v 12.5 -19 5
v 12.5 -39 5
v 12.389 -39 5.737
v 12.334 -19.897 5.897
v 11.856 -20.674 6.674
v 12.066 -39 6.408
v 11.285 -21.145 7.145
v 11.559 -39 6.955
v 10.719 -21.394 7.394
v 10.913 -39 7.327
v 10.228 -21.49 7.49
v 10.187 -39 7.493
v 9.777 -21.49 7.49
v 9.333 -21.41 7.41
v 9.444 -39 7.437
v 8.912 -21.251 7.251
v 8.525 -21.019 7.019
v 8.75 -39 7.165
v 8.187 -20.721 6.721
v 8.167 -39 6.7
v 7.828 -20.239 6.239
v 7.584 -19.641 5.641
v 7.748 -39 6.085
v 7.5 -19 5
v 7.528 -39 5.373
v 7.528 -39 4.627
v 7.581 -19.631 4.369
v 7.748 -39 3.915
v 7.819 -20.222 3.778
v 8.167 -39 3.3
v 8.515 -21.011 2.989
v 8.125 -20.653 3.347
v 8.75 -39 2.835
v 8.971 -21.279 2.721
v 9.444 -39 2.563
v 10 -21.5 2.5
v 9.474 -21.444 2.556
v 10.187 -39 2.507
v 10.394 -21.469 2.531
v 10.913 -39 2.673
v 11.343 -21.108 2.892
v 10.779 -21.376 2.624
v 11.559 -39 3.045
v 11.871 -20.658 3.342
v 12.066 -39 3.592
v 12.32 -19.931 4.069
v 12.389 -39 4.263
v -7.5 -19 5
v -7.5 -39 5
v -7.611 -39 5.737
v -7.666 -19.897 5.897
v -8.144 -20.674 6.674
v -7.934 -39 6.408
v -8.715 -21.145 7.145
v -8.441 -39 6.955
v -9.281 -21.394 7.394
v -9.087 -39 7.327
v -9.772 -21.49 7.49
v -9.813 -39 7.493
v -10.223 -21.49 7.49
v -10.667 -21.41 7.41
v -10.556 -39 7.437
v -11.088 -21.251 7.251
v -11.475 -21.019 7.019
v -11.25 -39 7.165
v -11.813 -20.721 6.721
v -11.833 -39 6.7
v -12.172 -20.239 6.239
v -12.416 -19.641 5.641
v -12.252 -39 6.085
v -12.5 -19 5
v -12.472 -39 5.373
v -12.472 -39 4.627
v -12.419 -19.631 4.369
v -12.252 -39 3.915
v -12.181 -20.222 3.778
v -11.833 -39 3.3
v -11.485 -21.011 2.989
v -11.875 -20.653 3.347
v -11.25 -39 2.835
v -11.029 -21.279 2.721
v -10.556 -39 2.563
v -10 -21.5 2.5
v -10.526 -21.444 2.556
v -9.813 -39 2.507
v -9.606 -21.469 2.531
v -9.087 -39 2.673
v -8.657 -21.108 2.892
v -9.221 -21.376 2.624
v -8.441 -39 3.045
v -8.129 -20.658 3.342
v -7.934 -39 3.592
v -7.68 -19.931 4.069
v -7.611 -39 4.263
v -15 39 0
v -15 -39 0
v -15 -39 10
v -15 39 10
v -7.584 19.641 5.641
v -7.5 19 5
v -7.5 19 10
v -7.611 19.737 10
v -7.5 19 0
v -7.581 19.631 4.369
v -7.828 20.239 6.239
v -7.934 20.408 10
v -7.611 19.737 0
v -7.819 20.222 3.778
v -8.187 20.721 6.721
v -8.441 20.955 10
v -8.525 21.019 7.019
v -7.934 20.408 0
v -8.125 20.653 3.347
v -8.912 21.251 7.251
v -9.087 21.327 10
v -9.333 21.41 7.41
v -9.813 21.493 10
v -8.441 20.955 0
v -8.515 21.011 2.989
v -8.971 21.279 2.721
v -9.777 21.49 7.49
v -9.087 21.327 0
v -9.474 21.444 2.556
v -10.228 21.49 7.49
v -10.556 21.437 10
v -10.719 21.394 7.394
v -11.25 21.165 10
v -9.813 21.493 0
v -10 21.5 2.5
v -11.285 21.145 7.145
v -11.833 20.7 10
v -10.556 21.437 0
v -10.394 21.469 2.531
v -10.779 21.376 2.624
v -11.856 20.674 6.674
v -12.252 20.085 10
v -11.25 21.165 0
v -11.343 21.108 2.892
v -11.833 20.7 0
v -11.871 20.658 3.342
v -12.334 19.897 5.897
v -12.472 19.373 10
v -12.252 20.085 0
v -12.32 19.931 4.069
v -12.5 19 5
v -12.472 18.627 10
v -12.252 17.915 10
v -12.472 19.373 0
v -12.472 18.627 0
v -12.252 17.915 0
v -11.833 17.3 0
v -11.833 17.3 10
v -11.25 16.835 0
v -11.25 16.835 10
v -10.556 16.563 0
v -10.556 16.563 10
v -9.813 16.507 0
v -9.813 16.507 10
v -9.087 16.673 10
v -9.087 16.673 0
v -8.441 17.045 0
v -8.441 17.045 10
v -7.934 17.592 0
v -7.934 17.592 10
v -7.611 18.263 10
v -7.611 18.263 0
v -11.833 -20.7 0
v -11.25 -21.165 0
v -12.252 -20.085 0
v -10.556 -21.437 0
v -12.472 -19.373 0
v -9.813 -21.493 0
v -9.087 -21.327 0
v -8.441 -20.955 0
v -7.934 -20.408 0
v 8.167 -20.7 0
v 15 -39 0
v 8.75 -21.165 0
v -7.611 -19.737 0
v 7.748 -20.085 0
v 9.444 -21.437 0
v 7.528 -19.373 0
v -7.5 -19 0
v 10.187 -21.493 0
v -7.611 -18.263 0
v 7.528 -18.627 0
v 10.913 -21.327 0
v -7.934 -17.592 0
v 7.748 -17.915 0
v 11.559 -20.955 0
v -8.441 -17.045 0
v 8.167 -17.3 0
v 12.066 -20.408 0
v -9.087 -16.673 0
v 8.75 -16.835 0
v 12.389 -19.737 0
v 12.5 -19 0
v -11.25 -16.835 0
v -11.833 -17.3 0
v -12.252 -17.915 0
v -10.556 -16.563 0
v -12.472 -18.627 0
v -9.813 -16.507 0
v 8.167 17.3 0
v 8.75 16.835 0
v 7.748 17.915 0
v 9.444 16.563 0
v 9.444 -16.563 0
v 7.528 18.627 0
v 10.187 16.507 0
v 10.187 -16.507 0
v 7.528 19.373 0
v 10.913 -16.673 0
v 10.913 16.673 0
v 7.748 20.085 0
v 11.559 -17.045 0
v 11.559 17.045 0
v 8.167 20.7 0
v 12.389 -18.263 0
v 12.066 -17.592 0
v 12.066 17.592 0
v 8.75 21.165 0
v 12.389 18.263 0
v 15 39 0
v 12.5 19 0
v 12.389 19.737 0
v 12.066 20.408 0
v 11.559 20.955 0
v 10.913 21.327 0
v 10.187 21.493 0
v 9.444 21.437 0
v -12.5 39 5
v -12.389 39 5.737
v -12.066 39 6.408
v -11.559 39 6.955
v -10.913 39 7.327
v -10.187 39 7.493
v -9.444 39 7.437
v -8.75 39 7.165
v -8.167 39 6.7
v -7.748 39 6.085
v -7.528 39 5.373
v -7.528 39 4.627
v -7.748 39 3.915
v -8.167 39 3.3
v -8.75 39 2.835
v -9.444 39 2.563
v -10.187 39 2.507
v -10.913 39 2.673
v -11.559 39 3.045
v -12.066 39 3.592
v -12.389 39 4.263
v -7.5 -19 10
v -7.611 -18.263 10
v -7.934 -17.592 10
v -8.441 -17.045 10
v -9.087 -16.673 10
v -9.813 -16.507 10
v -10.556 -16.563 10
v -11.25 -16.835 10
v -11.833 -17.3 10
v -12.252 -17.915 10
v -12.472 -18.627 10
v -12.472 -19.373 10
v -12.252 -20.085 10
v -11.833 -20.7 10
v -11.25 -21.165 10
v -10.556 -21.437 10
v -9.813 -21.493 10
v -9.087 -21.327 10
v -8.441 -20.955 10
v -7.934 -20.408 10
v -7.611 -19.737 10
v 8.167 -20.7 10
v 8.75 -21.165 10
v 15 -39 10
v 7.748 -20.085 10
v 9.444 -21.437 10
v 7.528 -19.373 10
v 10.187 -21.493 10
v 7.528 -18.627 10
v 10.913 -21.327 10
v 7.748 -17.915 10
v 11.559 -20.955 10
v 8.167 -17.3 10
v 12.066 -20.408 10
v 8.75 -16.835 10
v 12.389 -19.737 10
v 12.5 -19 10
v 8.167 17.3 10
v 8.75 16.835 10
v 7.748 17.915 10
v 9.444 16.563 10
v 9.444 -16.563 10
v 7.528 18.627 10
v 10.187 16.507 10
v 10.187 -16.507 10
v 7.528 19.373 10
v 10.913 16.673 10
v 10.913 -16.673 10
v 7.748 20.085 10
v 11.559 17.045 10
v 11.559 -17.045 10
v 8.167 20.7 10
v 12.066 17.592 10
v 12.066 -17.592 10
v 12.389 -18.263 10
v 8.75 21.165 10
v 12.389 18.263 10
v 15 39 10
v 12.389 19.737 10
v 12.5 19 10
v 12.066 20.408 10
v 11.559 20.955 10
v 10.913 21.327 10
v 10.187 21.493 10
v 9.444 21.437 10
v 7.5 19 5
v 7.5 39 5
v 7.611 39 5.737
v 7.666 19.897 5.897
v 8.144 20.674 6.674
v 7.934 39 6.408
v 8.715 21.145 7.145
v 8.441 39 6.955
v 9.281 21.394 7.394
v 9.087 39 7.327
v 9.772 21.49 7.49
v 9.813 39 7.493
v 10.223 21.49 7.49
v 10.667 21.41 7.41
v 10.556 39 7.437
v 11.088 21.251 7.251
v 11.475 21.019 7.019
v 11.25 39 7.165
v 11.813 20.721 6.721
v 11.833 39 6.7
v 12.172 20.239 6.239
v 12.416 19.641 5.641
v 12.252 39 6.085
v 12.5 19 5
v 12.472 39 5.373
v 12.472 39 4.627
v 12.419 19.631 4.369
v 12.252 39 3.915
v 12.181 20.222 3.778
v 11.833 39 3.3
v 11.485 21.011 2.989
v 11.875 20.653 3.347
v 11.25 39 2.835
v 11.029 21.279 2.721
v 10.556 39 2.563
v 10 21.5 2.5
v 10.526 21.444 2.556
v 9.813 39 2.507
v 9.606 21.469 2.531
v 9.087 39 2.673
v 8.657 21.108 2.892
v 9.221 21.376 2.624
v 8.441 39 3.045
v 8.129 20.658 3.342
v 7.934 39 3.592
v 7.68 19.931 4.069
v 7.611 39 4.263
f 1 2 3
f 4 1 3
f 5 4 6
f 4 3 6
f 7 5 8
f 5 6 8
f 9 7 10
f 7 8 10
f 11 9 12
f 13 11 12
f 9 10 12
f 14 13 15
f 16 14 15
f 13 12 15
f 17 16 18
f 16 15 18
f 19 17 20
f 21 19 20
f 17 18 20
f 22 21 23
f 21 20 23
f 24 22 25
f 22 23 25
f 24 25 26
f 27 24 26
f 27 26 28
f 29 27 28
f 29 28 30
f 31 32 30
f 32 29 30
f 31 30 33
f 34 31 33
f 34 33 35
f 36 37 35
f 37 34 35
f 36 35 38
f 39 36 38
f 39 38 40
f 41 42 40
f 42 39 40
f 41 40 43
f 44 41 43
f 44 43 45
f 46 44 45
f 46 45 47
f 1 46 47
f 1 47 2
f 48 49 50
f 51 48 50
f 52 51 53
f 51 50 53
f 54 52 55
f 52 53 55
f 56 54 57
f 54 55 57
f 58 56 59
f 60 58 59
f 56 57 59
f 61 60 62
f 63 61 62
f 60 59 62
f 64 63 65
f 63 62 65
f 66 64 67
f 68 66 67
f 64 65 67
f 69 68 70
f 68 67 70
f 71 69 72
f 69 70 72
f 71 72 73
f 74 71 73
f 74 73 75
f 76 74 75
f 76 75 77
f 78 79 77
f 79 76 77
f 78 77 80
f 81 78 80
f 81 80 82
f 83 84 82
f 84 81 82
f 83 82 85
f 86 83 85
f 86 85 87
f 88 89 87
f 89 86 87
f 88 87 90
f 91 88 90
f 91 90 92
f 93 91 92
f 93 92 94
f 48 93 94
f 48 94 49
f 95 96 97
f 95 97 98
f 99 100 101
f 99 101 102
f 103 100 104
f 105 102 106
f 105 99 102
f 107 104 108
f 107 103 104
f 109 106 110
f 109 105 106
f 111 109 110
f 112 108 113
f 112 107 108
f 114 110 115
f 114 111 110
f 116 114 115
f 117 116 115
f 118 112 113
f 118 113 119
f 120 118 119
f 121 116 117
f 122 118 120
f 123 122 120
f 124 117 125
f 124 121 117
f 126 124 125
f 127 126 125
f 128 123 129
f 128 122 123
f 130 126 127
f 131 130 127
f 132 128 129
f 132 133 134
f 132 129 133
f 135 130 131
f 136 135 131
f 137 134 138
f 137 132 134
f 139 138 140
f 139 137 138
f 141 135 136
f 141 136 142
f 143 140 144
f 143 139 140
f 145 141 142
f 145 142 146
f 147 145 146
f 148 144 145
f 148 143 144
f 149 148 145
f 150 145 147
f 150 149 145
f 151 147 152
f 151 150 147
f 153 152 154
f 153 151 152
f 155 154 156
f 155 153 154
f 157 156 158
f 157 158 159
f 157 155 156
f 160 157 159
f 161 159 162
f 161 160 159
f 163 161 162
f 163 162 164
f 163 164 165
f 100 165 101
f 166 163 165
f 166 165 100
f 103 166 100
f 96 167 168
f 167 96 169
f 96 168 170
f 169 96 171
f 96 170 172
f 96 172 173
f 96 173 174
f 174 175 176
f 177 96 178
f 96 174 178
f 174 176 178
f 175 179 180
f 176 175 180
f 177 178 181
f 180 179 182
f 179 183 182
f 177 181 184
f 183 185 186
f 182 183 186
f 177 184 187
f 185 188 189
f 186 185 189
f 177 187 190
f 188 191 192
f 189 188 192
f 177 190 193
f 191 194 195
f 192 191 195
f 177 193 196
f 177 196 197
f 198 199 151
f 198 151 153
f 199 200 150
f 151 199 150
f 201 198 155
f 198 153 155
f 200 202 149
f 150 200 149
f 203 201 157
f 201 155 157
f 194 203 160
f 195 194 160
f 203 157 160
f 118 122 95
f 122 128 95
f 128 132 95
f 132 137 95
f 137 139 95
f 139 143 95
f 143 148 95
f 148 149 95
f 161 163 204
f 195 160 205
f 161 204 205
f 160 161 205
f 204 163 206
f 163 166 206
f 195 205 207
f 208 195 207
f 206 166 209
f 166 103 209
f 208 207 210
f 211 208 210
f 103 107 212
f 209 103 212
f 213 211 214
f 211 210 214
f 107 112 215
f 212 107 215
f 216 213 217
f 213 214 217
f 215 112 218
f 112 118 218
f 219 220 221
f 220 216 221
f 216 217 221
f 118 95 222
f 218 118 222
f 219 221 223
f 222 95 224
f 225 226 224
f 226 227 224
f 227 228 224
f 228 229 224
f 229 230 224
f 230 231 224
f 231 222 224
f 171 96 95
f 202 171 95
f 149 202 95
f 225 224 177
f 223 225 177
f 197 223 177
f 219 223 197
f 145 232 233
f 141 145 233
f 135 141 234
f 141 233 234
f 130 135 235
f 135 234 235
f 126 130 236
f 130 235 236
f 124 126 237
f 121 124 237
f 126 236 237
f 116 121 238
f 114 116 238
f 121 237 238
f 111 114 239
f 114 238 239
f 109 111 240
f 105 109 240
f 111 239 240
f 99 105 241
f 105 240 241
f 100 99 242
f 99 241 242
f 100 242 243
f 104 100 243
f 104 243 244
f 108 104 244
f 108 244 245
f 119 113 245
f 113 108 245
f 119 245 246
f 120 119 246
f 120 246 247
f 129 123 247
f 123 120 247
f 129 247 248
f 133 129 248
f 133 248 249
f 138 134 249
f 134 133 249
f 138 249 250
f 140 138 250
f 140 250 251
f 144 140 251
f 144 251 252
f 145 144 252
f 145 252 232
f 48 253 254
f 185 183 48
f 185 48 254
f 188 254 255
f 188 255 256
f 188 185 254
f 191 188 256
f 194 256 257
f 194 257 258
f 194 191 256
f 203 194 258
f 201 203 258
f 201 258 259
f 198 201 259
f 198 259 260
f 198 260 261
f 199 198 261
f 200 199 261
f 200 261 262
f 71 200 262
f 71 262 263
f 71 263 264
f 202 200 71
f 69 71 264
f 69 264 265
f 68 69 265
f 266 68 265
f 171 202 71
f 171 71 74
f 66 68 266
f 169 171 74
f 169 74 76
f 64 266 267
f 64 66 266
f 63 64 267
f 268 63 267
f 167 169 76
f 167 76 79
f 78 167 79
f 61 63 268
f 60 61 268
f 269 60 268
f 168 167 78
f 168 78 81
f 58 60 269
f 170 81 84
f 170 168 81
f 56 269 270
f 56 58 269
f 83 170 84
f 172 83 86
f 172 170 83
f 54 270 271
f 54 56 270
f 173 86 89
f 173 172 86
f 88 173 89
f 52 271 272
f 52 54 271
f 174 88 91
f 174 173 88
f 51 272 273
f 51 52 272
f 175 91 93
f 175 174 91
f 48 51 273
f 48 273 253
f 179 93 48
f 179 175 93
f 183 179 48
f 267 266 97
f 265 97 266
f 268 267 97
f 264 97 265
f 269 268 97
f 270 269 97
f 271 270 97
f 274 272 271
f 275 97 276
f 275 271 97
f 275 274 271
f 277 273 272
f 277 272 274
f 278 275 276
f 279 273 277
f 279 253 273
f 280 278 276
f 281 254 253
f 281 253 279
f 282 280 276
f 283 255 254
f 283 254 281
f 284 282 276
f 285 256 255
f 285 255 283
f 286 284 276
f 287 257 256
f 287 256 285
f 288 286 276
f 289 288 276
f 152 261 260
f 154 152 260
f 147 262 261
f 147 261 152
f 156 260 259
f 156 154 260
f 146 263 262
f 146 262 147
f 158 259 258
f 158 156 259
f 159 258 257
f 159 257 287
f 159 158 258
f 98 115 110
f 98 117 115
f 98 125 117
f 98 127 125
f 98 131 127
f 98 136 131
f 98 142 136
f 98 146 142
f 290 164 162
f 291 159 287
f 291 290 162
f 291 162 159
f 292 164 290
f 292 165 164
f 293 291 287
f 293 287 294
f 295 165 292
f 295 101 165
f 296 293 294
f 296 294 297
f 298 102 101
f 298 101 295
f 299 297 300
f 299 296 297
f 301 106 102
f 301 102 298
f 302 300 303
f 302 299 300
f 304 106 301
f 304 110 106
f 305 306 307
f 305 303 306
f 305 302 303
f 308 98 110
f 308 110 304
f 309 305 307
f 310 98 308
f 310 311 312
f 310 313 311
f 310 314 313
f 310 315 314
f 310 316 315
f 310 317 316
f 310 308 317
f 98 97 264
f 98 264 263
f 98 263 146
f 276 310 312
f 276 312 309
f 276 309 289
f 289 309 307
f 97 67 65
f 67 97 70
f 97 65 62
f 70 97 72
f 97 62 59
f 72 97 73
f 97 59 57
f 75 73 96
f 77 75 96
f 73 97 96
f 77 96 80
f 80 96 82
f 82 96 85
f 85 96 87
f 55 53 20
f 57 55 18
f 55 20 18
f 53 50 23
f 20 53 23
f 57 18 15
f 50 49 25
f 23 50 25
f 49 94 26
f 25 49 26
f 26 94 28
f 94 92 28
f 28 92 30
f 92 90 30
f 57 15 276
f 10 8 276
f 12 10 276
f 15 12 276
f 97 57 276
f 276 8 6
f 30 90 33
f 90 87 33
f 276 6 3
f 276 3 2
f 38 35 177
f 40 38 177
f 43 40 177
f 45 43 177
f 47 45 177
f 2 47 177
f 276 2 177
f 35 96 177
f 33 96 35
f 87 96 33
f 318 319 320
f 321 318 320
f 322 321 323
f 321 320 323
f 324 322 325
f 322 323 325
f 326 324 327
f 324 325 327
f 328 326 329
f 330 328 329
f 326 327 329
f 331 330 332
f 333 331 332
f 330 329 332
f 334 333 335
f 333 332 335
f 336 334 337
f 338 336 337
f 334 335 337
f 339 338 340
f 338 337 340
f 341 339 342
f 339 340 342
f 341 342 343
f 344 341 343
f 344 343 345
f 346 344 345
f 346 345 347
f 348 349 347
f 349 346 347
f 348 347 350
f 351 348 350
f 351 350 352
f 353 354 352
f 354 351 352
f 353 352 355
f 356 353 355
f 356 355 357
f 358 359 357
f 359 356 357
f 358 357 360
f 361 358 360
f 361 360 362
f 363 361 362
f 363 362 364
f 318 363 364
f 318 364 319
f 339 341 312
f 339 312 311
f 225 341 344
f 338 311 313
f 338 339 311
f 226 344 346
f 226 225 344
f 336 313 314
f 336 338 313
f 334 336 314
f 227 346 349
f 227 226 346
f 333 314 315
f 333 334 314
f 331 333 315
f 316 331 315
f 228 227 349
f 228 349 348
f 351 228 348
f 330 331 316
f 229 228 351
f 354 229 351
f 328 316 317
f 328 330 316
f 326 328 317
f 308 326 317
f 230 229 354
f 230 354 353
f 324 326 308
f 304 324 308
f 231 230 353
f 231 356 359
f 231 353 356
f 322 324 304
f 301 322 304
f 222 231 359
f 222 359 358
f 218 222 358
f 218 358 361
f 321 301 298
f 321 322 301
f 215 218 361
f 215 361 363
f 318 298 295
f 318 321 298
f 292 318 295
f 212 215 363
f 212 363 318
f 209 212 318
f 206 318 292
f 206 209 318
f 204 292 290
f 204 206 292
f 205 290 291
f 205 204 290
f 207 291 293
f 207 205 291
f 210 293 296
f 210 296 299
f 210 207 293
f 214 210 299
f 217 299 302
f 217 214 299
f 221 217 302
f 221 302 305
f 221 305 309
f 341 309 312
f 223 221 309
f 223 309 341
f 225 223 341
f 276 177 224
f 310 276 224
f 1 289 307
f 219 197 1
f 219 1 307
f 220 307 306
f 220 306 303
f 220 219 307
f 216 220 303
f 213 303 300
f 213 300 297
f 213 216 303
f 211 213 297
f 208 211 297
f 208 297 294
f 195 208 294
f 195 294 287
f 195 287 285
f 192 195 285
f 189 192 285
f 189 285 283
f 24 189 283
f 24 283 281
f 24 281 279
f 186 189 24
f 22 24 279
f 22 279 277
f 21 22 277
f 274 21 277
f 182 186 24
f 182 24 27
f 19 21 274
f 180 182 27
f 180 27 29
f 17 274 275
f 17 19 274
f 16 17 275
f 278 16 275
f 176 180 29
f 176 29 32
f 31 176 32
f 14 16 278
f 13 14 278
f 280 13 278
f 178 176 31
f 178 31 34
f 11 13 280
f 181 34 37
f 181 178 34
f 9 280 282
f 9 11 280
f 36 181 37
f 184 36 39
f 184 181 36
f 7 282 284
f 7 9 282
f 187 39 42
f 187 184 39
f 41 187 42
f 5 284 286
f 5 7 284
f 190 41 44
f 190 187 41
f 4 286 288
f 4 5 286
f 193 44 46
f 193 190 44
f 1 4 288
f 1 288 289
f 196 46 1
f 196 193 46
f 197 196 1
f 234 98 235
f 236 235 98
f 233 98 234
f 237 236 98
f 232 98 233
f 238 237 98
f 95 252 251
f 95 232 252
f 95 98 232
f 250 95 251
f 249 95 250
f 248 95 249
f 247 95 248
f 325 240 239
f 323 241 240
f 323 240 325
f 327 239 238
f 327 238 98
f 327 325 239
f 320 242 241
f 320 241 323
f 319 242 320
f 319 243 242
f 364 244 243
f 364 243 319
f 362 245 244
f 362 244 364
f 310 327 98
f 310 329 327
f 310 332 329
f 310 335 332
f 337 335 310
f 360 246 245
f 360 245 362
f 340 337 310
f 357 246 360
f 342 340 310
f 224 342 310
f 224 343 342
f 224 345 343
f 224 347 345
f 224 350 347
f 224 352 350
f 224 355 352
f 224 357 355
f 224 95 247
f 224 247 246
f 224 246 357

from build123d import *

# Parameters (mm, degrees)
F0_W     = 30
F0_H     = 78
F0_R     = 2.5
F1_DEPTH = 10
F2_R     = 2.5
F3_DEPTH = 20
F4_R     = 2.5
F5_DEPTH = 20


with BuildPart() as f1:
    # F0 (on Top) → F1 (new body)
    with BuildSketch(Plane.XY):
        Rectangle(F0_W, F0_H)
        with Locations((-10, -19)):
            Circle(F0_R, mode=Mode.SUBTRACT)
        with Locations((10, -19)):
            Circle(F0_R, mode=Mode.SUBTRACT)
        with Locations((-10, 19)):
            Circle(F0_R, mode=Mode.SUBTRACT)
        with Locations((10, 19)):
            Circle(F0_R, mode=Mode.SUBTRACT)
    extrude(amount=F1_DEPTH)

    # F2 (on face) → F3 (cut)
    with BuildSketch(Plane(origin=(0, 39, 0), x_dir=(-1, 0, 0), z_dir=(0, 1, 0))):
        with Locations((-10, 5)):
            Circle(F2_R)
        with Locations((10, 5)):
            Circle(F2_R)
    extrude(amount=-F3_DEPTH, mode=Mode.SUBTRACT)

    # F4 (on face) → F5 (cut)
    with BuildSketch(Plane.XZ.offset(39)):
        with Locations((-10, 5)):
            Circle(F4_R)
        with Locations((10, 5)):
            Circle(F4_R)
    extrude(amount=-F5_DEPTH, mode=Mode.SUBTRACT)


solid = f1.part
